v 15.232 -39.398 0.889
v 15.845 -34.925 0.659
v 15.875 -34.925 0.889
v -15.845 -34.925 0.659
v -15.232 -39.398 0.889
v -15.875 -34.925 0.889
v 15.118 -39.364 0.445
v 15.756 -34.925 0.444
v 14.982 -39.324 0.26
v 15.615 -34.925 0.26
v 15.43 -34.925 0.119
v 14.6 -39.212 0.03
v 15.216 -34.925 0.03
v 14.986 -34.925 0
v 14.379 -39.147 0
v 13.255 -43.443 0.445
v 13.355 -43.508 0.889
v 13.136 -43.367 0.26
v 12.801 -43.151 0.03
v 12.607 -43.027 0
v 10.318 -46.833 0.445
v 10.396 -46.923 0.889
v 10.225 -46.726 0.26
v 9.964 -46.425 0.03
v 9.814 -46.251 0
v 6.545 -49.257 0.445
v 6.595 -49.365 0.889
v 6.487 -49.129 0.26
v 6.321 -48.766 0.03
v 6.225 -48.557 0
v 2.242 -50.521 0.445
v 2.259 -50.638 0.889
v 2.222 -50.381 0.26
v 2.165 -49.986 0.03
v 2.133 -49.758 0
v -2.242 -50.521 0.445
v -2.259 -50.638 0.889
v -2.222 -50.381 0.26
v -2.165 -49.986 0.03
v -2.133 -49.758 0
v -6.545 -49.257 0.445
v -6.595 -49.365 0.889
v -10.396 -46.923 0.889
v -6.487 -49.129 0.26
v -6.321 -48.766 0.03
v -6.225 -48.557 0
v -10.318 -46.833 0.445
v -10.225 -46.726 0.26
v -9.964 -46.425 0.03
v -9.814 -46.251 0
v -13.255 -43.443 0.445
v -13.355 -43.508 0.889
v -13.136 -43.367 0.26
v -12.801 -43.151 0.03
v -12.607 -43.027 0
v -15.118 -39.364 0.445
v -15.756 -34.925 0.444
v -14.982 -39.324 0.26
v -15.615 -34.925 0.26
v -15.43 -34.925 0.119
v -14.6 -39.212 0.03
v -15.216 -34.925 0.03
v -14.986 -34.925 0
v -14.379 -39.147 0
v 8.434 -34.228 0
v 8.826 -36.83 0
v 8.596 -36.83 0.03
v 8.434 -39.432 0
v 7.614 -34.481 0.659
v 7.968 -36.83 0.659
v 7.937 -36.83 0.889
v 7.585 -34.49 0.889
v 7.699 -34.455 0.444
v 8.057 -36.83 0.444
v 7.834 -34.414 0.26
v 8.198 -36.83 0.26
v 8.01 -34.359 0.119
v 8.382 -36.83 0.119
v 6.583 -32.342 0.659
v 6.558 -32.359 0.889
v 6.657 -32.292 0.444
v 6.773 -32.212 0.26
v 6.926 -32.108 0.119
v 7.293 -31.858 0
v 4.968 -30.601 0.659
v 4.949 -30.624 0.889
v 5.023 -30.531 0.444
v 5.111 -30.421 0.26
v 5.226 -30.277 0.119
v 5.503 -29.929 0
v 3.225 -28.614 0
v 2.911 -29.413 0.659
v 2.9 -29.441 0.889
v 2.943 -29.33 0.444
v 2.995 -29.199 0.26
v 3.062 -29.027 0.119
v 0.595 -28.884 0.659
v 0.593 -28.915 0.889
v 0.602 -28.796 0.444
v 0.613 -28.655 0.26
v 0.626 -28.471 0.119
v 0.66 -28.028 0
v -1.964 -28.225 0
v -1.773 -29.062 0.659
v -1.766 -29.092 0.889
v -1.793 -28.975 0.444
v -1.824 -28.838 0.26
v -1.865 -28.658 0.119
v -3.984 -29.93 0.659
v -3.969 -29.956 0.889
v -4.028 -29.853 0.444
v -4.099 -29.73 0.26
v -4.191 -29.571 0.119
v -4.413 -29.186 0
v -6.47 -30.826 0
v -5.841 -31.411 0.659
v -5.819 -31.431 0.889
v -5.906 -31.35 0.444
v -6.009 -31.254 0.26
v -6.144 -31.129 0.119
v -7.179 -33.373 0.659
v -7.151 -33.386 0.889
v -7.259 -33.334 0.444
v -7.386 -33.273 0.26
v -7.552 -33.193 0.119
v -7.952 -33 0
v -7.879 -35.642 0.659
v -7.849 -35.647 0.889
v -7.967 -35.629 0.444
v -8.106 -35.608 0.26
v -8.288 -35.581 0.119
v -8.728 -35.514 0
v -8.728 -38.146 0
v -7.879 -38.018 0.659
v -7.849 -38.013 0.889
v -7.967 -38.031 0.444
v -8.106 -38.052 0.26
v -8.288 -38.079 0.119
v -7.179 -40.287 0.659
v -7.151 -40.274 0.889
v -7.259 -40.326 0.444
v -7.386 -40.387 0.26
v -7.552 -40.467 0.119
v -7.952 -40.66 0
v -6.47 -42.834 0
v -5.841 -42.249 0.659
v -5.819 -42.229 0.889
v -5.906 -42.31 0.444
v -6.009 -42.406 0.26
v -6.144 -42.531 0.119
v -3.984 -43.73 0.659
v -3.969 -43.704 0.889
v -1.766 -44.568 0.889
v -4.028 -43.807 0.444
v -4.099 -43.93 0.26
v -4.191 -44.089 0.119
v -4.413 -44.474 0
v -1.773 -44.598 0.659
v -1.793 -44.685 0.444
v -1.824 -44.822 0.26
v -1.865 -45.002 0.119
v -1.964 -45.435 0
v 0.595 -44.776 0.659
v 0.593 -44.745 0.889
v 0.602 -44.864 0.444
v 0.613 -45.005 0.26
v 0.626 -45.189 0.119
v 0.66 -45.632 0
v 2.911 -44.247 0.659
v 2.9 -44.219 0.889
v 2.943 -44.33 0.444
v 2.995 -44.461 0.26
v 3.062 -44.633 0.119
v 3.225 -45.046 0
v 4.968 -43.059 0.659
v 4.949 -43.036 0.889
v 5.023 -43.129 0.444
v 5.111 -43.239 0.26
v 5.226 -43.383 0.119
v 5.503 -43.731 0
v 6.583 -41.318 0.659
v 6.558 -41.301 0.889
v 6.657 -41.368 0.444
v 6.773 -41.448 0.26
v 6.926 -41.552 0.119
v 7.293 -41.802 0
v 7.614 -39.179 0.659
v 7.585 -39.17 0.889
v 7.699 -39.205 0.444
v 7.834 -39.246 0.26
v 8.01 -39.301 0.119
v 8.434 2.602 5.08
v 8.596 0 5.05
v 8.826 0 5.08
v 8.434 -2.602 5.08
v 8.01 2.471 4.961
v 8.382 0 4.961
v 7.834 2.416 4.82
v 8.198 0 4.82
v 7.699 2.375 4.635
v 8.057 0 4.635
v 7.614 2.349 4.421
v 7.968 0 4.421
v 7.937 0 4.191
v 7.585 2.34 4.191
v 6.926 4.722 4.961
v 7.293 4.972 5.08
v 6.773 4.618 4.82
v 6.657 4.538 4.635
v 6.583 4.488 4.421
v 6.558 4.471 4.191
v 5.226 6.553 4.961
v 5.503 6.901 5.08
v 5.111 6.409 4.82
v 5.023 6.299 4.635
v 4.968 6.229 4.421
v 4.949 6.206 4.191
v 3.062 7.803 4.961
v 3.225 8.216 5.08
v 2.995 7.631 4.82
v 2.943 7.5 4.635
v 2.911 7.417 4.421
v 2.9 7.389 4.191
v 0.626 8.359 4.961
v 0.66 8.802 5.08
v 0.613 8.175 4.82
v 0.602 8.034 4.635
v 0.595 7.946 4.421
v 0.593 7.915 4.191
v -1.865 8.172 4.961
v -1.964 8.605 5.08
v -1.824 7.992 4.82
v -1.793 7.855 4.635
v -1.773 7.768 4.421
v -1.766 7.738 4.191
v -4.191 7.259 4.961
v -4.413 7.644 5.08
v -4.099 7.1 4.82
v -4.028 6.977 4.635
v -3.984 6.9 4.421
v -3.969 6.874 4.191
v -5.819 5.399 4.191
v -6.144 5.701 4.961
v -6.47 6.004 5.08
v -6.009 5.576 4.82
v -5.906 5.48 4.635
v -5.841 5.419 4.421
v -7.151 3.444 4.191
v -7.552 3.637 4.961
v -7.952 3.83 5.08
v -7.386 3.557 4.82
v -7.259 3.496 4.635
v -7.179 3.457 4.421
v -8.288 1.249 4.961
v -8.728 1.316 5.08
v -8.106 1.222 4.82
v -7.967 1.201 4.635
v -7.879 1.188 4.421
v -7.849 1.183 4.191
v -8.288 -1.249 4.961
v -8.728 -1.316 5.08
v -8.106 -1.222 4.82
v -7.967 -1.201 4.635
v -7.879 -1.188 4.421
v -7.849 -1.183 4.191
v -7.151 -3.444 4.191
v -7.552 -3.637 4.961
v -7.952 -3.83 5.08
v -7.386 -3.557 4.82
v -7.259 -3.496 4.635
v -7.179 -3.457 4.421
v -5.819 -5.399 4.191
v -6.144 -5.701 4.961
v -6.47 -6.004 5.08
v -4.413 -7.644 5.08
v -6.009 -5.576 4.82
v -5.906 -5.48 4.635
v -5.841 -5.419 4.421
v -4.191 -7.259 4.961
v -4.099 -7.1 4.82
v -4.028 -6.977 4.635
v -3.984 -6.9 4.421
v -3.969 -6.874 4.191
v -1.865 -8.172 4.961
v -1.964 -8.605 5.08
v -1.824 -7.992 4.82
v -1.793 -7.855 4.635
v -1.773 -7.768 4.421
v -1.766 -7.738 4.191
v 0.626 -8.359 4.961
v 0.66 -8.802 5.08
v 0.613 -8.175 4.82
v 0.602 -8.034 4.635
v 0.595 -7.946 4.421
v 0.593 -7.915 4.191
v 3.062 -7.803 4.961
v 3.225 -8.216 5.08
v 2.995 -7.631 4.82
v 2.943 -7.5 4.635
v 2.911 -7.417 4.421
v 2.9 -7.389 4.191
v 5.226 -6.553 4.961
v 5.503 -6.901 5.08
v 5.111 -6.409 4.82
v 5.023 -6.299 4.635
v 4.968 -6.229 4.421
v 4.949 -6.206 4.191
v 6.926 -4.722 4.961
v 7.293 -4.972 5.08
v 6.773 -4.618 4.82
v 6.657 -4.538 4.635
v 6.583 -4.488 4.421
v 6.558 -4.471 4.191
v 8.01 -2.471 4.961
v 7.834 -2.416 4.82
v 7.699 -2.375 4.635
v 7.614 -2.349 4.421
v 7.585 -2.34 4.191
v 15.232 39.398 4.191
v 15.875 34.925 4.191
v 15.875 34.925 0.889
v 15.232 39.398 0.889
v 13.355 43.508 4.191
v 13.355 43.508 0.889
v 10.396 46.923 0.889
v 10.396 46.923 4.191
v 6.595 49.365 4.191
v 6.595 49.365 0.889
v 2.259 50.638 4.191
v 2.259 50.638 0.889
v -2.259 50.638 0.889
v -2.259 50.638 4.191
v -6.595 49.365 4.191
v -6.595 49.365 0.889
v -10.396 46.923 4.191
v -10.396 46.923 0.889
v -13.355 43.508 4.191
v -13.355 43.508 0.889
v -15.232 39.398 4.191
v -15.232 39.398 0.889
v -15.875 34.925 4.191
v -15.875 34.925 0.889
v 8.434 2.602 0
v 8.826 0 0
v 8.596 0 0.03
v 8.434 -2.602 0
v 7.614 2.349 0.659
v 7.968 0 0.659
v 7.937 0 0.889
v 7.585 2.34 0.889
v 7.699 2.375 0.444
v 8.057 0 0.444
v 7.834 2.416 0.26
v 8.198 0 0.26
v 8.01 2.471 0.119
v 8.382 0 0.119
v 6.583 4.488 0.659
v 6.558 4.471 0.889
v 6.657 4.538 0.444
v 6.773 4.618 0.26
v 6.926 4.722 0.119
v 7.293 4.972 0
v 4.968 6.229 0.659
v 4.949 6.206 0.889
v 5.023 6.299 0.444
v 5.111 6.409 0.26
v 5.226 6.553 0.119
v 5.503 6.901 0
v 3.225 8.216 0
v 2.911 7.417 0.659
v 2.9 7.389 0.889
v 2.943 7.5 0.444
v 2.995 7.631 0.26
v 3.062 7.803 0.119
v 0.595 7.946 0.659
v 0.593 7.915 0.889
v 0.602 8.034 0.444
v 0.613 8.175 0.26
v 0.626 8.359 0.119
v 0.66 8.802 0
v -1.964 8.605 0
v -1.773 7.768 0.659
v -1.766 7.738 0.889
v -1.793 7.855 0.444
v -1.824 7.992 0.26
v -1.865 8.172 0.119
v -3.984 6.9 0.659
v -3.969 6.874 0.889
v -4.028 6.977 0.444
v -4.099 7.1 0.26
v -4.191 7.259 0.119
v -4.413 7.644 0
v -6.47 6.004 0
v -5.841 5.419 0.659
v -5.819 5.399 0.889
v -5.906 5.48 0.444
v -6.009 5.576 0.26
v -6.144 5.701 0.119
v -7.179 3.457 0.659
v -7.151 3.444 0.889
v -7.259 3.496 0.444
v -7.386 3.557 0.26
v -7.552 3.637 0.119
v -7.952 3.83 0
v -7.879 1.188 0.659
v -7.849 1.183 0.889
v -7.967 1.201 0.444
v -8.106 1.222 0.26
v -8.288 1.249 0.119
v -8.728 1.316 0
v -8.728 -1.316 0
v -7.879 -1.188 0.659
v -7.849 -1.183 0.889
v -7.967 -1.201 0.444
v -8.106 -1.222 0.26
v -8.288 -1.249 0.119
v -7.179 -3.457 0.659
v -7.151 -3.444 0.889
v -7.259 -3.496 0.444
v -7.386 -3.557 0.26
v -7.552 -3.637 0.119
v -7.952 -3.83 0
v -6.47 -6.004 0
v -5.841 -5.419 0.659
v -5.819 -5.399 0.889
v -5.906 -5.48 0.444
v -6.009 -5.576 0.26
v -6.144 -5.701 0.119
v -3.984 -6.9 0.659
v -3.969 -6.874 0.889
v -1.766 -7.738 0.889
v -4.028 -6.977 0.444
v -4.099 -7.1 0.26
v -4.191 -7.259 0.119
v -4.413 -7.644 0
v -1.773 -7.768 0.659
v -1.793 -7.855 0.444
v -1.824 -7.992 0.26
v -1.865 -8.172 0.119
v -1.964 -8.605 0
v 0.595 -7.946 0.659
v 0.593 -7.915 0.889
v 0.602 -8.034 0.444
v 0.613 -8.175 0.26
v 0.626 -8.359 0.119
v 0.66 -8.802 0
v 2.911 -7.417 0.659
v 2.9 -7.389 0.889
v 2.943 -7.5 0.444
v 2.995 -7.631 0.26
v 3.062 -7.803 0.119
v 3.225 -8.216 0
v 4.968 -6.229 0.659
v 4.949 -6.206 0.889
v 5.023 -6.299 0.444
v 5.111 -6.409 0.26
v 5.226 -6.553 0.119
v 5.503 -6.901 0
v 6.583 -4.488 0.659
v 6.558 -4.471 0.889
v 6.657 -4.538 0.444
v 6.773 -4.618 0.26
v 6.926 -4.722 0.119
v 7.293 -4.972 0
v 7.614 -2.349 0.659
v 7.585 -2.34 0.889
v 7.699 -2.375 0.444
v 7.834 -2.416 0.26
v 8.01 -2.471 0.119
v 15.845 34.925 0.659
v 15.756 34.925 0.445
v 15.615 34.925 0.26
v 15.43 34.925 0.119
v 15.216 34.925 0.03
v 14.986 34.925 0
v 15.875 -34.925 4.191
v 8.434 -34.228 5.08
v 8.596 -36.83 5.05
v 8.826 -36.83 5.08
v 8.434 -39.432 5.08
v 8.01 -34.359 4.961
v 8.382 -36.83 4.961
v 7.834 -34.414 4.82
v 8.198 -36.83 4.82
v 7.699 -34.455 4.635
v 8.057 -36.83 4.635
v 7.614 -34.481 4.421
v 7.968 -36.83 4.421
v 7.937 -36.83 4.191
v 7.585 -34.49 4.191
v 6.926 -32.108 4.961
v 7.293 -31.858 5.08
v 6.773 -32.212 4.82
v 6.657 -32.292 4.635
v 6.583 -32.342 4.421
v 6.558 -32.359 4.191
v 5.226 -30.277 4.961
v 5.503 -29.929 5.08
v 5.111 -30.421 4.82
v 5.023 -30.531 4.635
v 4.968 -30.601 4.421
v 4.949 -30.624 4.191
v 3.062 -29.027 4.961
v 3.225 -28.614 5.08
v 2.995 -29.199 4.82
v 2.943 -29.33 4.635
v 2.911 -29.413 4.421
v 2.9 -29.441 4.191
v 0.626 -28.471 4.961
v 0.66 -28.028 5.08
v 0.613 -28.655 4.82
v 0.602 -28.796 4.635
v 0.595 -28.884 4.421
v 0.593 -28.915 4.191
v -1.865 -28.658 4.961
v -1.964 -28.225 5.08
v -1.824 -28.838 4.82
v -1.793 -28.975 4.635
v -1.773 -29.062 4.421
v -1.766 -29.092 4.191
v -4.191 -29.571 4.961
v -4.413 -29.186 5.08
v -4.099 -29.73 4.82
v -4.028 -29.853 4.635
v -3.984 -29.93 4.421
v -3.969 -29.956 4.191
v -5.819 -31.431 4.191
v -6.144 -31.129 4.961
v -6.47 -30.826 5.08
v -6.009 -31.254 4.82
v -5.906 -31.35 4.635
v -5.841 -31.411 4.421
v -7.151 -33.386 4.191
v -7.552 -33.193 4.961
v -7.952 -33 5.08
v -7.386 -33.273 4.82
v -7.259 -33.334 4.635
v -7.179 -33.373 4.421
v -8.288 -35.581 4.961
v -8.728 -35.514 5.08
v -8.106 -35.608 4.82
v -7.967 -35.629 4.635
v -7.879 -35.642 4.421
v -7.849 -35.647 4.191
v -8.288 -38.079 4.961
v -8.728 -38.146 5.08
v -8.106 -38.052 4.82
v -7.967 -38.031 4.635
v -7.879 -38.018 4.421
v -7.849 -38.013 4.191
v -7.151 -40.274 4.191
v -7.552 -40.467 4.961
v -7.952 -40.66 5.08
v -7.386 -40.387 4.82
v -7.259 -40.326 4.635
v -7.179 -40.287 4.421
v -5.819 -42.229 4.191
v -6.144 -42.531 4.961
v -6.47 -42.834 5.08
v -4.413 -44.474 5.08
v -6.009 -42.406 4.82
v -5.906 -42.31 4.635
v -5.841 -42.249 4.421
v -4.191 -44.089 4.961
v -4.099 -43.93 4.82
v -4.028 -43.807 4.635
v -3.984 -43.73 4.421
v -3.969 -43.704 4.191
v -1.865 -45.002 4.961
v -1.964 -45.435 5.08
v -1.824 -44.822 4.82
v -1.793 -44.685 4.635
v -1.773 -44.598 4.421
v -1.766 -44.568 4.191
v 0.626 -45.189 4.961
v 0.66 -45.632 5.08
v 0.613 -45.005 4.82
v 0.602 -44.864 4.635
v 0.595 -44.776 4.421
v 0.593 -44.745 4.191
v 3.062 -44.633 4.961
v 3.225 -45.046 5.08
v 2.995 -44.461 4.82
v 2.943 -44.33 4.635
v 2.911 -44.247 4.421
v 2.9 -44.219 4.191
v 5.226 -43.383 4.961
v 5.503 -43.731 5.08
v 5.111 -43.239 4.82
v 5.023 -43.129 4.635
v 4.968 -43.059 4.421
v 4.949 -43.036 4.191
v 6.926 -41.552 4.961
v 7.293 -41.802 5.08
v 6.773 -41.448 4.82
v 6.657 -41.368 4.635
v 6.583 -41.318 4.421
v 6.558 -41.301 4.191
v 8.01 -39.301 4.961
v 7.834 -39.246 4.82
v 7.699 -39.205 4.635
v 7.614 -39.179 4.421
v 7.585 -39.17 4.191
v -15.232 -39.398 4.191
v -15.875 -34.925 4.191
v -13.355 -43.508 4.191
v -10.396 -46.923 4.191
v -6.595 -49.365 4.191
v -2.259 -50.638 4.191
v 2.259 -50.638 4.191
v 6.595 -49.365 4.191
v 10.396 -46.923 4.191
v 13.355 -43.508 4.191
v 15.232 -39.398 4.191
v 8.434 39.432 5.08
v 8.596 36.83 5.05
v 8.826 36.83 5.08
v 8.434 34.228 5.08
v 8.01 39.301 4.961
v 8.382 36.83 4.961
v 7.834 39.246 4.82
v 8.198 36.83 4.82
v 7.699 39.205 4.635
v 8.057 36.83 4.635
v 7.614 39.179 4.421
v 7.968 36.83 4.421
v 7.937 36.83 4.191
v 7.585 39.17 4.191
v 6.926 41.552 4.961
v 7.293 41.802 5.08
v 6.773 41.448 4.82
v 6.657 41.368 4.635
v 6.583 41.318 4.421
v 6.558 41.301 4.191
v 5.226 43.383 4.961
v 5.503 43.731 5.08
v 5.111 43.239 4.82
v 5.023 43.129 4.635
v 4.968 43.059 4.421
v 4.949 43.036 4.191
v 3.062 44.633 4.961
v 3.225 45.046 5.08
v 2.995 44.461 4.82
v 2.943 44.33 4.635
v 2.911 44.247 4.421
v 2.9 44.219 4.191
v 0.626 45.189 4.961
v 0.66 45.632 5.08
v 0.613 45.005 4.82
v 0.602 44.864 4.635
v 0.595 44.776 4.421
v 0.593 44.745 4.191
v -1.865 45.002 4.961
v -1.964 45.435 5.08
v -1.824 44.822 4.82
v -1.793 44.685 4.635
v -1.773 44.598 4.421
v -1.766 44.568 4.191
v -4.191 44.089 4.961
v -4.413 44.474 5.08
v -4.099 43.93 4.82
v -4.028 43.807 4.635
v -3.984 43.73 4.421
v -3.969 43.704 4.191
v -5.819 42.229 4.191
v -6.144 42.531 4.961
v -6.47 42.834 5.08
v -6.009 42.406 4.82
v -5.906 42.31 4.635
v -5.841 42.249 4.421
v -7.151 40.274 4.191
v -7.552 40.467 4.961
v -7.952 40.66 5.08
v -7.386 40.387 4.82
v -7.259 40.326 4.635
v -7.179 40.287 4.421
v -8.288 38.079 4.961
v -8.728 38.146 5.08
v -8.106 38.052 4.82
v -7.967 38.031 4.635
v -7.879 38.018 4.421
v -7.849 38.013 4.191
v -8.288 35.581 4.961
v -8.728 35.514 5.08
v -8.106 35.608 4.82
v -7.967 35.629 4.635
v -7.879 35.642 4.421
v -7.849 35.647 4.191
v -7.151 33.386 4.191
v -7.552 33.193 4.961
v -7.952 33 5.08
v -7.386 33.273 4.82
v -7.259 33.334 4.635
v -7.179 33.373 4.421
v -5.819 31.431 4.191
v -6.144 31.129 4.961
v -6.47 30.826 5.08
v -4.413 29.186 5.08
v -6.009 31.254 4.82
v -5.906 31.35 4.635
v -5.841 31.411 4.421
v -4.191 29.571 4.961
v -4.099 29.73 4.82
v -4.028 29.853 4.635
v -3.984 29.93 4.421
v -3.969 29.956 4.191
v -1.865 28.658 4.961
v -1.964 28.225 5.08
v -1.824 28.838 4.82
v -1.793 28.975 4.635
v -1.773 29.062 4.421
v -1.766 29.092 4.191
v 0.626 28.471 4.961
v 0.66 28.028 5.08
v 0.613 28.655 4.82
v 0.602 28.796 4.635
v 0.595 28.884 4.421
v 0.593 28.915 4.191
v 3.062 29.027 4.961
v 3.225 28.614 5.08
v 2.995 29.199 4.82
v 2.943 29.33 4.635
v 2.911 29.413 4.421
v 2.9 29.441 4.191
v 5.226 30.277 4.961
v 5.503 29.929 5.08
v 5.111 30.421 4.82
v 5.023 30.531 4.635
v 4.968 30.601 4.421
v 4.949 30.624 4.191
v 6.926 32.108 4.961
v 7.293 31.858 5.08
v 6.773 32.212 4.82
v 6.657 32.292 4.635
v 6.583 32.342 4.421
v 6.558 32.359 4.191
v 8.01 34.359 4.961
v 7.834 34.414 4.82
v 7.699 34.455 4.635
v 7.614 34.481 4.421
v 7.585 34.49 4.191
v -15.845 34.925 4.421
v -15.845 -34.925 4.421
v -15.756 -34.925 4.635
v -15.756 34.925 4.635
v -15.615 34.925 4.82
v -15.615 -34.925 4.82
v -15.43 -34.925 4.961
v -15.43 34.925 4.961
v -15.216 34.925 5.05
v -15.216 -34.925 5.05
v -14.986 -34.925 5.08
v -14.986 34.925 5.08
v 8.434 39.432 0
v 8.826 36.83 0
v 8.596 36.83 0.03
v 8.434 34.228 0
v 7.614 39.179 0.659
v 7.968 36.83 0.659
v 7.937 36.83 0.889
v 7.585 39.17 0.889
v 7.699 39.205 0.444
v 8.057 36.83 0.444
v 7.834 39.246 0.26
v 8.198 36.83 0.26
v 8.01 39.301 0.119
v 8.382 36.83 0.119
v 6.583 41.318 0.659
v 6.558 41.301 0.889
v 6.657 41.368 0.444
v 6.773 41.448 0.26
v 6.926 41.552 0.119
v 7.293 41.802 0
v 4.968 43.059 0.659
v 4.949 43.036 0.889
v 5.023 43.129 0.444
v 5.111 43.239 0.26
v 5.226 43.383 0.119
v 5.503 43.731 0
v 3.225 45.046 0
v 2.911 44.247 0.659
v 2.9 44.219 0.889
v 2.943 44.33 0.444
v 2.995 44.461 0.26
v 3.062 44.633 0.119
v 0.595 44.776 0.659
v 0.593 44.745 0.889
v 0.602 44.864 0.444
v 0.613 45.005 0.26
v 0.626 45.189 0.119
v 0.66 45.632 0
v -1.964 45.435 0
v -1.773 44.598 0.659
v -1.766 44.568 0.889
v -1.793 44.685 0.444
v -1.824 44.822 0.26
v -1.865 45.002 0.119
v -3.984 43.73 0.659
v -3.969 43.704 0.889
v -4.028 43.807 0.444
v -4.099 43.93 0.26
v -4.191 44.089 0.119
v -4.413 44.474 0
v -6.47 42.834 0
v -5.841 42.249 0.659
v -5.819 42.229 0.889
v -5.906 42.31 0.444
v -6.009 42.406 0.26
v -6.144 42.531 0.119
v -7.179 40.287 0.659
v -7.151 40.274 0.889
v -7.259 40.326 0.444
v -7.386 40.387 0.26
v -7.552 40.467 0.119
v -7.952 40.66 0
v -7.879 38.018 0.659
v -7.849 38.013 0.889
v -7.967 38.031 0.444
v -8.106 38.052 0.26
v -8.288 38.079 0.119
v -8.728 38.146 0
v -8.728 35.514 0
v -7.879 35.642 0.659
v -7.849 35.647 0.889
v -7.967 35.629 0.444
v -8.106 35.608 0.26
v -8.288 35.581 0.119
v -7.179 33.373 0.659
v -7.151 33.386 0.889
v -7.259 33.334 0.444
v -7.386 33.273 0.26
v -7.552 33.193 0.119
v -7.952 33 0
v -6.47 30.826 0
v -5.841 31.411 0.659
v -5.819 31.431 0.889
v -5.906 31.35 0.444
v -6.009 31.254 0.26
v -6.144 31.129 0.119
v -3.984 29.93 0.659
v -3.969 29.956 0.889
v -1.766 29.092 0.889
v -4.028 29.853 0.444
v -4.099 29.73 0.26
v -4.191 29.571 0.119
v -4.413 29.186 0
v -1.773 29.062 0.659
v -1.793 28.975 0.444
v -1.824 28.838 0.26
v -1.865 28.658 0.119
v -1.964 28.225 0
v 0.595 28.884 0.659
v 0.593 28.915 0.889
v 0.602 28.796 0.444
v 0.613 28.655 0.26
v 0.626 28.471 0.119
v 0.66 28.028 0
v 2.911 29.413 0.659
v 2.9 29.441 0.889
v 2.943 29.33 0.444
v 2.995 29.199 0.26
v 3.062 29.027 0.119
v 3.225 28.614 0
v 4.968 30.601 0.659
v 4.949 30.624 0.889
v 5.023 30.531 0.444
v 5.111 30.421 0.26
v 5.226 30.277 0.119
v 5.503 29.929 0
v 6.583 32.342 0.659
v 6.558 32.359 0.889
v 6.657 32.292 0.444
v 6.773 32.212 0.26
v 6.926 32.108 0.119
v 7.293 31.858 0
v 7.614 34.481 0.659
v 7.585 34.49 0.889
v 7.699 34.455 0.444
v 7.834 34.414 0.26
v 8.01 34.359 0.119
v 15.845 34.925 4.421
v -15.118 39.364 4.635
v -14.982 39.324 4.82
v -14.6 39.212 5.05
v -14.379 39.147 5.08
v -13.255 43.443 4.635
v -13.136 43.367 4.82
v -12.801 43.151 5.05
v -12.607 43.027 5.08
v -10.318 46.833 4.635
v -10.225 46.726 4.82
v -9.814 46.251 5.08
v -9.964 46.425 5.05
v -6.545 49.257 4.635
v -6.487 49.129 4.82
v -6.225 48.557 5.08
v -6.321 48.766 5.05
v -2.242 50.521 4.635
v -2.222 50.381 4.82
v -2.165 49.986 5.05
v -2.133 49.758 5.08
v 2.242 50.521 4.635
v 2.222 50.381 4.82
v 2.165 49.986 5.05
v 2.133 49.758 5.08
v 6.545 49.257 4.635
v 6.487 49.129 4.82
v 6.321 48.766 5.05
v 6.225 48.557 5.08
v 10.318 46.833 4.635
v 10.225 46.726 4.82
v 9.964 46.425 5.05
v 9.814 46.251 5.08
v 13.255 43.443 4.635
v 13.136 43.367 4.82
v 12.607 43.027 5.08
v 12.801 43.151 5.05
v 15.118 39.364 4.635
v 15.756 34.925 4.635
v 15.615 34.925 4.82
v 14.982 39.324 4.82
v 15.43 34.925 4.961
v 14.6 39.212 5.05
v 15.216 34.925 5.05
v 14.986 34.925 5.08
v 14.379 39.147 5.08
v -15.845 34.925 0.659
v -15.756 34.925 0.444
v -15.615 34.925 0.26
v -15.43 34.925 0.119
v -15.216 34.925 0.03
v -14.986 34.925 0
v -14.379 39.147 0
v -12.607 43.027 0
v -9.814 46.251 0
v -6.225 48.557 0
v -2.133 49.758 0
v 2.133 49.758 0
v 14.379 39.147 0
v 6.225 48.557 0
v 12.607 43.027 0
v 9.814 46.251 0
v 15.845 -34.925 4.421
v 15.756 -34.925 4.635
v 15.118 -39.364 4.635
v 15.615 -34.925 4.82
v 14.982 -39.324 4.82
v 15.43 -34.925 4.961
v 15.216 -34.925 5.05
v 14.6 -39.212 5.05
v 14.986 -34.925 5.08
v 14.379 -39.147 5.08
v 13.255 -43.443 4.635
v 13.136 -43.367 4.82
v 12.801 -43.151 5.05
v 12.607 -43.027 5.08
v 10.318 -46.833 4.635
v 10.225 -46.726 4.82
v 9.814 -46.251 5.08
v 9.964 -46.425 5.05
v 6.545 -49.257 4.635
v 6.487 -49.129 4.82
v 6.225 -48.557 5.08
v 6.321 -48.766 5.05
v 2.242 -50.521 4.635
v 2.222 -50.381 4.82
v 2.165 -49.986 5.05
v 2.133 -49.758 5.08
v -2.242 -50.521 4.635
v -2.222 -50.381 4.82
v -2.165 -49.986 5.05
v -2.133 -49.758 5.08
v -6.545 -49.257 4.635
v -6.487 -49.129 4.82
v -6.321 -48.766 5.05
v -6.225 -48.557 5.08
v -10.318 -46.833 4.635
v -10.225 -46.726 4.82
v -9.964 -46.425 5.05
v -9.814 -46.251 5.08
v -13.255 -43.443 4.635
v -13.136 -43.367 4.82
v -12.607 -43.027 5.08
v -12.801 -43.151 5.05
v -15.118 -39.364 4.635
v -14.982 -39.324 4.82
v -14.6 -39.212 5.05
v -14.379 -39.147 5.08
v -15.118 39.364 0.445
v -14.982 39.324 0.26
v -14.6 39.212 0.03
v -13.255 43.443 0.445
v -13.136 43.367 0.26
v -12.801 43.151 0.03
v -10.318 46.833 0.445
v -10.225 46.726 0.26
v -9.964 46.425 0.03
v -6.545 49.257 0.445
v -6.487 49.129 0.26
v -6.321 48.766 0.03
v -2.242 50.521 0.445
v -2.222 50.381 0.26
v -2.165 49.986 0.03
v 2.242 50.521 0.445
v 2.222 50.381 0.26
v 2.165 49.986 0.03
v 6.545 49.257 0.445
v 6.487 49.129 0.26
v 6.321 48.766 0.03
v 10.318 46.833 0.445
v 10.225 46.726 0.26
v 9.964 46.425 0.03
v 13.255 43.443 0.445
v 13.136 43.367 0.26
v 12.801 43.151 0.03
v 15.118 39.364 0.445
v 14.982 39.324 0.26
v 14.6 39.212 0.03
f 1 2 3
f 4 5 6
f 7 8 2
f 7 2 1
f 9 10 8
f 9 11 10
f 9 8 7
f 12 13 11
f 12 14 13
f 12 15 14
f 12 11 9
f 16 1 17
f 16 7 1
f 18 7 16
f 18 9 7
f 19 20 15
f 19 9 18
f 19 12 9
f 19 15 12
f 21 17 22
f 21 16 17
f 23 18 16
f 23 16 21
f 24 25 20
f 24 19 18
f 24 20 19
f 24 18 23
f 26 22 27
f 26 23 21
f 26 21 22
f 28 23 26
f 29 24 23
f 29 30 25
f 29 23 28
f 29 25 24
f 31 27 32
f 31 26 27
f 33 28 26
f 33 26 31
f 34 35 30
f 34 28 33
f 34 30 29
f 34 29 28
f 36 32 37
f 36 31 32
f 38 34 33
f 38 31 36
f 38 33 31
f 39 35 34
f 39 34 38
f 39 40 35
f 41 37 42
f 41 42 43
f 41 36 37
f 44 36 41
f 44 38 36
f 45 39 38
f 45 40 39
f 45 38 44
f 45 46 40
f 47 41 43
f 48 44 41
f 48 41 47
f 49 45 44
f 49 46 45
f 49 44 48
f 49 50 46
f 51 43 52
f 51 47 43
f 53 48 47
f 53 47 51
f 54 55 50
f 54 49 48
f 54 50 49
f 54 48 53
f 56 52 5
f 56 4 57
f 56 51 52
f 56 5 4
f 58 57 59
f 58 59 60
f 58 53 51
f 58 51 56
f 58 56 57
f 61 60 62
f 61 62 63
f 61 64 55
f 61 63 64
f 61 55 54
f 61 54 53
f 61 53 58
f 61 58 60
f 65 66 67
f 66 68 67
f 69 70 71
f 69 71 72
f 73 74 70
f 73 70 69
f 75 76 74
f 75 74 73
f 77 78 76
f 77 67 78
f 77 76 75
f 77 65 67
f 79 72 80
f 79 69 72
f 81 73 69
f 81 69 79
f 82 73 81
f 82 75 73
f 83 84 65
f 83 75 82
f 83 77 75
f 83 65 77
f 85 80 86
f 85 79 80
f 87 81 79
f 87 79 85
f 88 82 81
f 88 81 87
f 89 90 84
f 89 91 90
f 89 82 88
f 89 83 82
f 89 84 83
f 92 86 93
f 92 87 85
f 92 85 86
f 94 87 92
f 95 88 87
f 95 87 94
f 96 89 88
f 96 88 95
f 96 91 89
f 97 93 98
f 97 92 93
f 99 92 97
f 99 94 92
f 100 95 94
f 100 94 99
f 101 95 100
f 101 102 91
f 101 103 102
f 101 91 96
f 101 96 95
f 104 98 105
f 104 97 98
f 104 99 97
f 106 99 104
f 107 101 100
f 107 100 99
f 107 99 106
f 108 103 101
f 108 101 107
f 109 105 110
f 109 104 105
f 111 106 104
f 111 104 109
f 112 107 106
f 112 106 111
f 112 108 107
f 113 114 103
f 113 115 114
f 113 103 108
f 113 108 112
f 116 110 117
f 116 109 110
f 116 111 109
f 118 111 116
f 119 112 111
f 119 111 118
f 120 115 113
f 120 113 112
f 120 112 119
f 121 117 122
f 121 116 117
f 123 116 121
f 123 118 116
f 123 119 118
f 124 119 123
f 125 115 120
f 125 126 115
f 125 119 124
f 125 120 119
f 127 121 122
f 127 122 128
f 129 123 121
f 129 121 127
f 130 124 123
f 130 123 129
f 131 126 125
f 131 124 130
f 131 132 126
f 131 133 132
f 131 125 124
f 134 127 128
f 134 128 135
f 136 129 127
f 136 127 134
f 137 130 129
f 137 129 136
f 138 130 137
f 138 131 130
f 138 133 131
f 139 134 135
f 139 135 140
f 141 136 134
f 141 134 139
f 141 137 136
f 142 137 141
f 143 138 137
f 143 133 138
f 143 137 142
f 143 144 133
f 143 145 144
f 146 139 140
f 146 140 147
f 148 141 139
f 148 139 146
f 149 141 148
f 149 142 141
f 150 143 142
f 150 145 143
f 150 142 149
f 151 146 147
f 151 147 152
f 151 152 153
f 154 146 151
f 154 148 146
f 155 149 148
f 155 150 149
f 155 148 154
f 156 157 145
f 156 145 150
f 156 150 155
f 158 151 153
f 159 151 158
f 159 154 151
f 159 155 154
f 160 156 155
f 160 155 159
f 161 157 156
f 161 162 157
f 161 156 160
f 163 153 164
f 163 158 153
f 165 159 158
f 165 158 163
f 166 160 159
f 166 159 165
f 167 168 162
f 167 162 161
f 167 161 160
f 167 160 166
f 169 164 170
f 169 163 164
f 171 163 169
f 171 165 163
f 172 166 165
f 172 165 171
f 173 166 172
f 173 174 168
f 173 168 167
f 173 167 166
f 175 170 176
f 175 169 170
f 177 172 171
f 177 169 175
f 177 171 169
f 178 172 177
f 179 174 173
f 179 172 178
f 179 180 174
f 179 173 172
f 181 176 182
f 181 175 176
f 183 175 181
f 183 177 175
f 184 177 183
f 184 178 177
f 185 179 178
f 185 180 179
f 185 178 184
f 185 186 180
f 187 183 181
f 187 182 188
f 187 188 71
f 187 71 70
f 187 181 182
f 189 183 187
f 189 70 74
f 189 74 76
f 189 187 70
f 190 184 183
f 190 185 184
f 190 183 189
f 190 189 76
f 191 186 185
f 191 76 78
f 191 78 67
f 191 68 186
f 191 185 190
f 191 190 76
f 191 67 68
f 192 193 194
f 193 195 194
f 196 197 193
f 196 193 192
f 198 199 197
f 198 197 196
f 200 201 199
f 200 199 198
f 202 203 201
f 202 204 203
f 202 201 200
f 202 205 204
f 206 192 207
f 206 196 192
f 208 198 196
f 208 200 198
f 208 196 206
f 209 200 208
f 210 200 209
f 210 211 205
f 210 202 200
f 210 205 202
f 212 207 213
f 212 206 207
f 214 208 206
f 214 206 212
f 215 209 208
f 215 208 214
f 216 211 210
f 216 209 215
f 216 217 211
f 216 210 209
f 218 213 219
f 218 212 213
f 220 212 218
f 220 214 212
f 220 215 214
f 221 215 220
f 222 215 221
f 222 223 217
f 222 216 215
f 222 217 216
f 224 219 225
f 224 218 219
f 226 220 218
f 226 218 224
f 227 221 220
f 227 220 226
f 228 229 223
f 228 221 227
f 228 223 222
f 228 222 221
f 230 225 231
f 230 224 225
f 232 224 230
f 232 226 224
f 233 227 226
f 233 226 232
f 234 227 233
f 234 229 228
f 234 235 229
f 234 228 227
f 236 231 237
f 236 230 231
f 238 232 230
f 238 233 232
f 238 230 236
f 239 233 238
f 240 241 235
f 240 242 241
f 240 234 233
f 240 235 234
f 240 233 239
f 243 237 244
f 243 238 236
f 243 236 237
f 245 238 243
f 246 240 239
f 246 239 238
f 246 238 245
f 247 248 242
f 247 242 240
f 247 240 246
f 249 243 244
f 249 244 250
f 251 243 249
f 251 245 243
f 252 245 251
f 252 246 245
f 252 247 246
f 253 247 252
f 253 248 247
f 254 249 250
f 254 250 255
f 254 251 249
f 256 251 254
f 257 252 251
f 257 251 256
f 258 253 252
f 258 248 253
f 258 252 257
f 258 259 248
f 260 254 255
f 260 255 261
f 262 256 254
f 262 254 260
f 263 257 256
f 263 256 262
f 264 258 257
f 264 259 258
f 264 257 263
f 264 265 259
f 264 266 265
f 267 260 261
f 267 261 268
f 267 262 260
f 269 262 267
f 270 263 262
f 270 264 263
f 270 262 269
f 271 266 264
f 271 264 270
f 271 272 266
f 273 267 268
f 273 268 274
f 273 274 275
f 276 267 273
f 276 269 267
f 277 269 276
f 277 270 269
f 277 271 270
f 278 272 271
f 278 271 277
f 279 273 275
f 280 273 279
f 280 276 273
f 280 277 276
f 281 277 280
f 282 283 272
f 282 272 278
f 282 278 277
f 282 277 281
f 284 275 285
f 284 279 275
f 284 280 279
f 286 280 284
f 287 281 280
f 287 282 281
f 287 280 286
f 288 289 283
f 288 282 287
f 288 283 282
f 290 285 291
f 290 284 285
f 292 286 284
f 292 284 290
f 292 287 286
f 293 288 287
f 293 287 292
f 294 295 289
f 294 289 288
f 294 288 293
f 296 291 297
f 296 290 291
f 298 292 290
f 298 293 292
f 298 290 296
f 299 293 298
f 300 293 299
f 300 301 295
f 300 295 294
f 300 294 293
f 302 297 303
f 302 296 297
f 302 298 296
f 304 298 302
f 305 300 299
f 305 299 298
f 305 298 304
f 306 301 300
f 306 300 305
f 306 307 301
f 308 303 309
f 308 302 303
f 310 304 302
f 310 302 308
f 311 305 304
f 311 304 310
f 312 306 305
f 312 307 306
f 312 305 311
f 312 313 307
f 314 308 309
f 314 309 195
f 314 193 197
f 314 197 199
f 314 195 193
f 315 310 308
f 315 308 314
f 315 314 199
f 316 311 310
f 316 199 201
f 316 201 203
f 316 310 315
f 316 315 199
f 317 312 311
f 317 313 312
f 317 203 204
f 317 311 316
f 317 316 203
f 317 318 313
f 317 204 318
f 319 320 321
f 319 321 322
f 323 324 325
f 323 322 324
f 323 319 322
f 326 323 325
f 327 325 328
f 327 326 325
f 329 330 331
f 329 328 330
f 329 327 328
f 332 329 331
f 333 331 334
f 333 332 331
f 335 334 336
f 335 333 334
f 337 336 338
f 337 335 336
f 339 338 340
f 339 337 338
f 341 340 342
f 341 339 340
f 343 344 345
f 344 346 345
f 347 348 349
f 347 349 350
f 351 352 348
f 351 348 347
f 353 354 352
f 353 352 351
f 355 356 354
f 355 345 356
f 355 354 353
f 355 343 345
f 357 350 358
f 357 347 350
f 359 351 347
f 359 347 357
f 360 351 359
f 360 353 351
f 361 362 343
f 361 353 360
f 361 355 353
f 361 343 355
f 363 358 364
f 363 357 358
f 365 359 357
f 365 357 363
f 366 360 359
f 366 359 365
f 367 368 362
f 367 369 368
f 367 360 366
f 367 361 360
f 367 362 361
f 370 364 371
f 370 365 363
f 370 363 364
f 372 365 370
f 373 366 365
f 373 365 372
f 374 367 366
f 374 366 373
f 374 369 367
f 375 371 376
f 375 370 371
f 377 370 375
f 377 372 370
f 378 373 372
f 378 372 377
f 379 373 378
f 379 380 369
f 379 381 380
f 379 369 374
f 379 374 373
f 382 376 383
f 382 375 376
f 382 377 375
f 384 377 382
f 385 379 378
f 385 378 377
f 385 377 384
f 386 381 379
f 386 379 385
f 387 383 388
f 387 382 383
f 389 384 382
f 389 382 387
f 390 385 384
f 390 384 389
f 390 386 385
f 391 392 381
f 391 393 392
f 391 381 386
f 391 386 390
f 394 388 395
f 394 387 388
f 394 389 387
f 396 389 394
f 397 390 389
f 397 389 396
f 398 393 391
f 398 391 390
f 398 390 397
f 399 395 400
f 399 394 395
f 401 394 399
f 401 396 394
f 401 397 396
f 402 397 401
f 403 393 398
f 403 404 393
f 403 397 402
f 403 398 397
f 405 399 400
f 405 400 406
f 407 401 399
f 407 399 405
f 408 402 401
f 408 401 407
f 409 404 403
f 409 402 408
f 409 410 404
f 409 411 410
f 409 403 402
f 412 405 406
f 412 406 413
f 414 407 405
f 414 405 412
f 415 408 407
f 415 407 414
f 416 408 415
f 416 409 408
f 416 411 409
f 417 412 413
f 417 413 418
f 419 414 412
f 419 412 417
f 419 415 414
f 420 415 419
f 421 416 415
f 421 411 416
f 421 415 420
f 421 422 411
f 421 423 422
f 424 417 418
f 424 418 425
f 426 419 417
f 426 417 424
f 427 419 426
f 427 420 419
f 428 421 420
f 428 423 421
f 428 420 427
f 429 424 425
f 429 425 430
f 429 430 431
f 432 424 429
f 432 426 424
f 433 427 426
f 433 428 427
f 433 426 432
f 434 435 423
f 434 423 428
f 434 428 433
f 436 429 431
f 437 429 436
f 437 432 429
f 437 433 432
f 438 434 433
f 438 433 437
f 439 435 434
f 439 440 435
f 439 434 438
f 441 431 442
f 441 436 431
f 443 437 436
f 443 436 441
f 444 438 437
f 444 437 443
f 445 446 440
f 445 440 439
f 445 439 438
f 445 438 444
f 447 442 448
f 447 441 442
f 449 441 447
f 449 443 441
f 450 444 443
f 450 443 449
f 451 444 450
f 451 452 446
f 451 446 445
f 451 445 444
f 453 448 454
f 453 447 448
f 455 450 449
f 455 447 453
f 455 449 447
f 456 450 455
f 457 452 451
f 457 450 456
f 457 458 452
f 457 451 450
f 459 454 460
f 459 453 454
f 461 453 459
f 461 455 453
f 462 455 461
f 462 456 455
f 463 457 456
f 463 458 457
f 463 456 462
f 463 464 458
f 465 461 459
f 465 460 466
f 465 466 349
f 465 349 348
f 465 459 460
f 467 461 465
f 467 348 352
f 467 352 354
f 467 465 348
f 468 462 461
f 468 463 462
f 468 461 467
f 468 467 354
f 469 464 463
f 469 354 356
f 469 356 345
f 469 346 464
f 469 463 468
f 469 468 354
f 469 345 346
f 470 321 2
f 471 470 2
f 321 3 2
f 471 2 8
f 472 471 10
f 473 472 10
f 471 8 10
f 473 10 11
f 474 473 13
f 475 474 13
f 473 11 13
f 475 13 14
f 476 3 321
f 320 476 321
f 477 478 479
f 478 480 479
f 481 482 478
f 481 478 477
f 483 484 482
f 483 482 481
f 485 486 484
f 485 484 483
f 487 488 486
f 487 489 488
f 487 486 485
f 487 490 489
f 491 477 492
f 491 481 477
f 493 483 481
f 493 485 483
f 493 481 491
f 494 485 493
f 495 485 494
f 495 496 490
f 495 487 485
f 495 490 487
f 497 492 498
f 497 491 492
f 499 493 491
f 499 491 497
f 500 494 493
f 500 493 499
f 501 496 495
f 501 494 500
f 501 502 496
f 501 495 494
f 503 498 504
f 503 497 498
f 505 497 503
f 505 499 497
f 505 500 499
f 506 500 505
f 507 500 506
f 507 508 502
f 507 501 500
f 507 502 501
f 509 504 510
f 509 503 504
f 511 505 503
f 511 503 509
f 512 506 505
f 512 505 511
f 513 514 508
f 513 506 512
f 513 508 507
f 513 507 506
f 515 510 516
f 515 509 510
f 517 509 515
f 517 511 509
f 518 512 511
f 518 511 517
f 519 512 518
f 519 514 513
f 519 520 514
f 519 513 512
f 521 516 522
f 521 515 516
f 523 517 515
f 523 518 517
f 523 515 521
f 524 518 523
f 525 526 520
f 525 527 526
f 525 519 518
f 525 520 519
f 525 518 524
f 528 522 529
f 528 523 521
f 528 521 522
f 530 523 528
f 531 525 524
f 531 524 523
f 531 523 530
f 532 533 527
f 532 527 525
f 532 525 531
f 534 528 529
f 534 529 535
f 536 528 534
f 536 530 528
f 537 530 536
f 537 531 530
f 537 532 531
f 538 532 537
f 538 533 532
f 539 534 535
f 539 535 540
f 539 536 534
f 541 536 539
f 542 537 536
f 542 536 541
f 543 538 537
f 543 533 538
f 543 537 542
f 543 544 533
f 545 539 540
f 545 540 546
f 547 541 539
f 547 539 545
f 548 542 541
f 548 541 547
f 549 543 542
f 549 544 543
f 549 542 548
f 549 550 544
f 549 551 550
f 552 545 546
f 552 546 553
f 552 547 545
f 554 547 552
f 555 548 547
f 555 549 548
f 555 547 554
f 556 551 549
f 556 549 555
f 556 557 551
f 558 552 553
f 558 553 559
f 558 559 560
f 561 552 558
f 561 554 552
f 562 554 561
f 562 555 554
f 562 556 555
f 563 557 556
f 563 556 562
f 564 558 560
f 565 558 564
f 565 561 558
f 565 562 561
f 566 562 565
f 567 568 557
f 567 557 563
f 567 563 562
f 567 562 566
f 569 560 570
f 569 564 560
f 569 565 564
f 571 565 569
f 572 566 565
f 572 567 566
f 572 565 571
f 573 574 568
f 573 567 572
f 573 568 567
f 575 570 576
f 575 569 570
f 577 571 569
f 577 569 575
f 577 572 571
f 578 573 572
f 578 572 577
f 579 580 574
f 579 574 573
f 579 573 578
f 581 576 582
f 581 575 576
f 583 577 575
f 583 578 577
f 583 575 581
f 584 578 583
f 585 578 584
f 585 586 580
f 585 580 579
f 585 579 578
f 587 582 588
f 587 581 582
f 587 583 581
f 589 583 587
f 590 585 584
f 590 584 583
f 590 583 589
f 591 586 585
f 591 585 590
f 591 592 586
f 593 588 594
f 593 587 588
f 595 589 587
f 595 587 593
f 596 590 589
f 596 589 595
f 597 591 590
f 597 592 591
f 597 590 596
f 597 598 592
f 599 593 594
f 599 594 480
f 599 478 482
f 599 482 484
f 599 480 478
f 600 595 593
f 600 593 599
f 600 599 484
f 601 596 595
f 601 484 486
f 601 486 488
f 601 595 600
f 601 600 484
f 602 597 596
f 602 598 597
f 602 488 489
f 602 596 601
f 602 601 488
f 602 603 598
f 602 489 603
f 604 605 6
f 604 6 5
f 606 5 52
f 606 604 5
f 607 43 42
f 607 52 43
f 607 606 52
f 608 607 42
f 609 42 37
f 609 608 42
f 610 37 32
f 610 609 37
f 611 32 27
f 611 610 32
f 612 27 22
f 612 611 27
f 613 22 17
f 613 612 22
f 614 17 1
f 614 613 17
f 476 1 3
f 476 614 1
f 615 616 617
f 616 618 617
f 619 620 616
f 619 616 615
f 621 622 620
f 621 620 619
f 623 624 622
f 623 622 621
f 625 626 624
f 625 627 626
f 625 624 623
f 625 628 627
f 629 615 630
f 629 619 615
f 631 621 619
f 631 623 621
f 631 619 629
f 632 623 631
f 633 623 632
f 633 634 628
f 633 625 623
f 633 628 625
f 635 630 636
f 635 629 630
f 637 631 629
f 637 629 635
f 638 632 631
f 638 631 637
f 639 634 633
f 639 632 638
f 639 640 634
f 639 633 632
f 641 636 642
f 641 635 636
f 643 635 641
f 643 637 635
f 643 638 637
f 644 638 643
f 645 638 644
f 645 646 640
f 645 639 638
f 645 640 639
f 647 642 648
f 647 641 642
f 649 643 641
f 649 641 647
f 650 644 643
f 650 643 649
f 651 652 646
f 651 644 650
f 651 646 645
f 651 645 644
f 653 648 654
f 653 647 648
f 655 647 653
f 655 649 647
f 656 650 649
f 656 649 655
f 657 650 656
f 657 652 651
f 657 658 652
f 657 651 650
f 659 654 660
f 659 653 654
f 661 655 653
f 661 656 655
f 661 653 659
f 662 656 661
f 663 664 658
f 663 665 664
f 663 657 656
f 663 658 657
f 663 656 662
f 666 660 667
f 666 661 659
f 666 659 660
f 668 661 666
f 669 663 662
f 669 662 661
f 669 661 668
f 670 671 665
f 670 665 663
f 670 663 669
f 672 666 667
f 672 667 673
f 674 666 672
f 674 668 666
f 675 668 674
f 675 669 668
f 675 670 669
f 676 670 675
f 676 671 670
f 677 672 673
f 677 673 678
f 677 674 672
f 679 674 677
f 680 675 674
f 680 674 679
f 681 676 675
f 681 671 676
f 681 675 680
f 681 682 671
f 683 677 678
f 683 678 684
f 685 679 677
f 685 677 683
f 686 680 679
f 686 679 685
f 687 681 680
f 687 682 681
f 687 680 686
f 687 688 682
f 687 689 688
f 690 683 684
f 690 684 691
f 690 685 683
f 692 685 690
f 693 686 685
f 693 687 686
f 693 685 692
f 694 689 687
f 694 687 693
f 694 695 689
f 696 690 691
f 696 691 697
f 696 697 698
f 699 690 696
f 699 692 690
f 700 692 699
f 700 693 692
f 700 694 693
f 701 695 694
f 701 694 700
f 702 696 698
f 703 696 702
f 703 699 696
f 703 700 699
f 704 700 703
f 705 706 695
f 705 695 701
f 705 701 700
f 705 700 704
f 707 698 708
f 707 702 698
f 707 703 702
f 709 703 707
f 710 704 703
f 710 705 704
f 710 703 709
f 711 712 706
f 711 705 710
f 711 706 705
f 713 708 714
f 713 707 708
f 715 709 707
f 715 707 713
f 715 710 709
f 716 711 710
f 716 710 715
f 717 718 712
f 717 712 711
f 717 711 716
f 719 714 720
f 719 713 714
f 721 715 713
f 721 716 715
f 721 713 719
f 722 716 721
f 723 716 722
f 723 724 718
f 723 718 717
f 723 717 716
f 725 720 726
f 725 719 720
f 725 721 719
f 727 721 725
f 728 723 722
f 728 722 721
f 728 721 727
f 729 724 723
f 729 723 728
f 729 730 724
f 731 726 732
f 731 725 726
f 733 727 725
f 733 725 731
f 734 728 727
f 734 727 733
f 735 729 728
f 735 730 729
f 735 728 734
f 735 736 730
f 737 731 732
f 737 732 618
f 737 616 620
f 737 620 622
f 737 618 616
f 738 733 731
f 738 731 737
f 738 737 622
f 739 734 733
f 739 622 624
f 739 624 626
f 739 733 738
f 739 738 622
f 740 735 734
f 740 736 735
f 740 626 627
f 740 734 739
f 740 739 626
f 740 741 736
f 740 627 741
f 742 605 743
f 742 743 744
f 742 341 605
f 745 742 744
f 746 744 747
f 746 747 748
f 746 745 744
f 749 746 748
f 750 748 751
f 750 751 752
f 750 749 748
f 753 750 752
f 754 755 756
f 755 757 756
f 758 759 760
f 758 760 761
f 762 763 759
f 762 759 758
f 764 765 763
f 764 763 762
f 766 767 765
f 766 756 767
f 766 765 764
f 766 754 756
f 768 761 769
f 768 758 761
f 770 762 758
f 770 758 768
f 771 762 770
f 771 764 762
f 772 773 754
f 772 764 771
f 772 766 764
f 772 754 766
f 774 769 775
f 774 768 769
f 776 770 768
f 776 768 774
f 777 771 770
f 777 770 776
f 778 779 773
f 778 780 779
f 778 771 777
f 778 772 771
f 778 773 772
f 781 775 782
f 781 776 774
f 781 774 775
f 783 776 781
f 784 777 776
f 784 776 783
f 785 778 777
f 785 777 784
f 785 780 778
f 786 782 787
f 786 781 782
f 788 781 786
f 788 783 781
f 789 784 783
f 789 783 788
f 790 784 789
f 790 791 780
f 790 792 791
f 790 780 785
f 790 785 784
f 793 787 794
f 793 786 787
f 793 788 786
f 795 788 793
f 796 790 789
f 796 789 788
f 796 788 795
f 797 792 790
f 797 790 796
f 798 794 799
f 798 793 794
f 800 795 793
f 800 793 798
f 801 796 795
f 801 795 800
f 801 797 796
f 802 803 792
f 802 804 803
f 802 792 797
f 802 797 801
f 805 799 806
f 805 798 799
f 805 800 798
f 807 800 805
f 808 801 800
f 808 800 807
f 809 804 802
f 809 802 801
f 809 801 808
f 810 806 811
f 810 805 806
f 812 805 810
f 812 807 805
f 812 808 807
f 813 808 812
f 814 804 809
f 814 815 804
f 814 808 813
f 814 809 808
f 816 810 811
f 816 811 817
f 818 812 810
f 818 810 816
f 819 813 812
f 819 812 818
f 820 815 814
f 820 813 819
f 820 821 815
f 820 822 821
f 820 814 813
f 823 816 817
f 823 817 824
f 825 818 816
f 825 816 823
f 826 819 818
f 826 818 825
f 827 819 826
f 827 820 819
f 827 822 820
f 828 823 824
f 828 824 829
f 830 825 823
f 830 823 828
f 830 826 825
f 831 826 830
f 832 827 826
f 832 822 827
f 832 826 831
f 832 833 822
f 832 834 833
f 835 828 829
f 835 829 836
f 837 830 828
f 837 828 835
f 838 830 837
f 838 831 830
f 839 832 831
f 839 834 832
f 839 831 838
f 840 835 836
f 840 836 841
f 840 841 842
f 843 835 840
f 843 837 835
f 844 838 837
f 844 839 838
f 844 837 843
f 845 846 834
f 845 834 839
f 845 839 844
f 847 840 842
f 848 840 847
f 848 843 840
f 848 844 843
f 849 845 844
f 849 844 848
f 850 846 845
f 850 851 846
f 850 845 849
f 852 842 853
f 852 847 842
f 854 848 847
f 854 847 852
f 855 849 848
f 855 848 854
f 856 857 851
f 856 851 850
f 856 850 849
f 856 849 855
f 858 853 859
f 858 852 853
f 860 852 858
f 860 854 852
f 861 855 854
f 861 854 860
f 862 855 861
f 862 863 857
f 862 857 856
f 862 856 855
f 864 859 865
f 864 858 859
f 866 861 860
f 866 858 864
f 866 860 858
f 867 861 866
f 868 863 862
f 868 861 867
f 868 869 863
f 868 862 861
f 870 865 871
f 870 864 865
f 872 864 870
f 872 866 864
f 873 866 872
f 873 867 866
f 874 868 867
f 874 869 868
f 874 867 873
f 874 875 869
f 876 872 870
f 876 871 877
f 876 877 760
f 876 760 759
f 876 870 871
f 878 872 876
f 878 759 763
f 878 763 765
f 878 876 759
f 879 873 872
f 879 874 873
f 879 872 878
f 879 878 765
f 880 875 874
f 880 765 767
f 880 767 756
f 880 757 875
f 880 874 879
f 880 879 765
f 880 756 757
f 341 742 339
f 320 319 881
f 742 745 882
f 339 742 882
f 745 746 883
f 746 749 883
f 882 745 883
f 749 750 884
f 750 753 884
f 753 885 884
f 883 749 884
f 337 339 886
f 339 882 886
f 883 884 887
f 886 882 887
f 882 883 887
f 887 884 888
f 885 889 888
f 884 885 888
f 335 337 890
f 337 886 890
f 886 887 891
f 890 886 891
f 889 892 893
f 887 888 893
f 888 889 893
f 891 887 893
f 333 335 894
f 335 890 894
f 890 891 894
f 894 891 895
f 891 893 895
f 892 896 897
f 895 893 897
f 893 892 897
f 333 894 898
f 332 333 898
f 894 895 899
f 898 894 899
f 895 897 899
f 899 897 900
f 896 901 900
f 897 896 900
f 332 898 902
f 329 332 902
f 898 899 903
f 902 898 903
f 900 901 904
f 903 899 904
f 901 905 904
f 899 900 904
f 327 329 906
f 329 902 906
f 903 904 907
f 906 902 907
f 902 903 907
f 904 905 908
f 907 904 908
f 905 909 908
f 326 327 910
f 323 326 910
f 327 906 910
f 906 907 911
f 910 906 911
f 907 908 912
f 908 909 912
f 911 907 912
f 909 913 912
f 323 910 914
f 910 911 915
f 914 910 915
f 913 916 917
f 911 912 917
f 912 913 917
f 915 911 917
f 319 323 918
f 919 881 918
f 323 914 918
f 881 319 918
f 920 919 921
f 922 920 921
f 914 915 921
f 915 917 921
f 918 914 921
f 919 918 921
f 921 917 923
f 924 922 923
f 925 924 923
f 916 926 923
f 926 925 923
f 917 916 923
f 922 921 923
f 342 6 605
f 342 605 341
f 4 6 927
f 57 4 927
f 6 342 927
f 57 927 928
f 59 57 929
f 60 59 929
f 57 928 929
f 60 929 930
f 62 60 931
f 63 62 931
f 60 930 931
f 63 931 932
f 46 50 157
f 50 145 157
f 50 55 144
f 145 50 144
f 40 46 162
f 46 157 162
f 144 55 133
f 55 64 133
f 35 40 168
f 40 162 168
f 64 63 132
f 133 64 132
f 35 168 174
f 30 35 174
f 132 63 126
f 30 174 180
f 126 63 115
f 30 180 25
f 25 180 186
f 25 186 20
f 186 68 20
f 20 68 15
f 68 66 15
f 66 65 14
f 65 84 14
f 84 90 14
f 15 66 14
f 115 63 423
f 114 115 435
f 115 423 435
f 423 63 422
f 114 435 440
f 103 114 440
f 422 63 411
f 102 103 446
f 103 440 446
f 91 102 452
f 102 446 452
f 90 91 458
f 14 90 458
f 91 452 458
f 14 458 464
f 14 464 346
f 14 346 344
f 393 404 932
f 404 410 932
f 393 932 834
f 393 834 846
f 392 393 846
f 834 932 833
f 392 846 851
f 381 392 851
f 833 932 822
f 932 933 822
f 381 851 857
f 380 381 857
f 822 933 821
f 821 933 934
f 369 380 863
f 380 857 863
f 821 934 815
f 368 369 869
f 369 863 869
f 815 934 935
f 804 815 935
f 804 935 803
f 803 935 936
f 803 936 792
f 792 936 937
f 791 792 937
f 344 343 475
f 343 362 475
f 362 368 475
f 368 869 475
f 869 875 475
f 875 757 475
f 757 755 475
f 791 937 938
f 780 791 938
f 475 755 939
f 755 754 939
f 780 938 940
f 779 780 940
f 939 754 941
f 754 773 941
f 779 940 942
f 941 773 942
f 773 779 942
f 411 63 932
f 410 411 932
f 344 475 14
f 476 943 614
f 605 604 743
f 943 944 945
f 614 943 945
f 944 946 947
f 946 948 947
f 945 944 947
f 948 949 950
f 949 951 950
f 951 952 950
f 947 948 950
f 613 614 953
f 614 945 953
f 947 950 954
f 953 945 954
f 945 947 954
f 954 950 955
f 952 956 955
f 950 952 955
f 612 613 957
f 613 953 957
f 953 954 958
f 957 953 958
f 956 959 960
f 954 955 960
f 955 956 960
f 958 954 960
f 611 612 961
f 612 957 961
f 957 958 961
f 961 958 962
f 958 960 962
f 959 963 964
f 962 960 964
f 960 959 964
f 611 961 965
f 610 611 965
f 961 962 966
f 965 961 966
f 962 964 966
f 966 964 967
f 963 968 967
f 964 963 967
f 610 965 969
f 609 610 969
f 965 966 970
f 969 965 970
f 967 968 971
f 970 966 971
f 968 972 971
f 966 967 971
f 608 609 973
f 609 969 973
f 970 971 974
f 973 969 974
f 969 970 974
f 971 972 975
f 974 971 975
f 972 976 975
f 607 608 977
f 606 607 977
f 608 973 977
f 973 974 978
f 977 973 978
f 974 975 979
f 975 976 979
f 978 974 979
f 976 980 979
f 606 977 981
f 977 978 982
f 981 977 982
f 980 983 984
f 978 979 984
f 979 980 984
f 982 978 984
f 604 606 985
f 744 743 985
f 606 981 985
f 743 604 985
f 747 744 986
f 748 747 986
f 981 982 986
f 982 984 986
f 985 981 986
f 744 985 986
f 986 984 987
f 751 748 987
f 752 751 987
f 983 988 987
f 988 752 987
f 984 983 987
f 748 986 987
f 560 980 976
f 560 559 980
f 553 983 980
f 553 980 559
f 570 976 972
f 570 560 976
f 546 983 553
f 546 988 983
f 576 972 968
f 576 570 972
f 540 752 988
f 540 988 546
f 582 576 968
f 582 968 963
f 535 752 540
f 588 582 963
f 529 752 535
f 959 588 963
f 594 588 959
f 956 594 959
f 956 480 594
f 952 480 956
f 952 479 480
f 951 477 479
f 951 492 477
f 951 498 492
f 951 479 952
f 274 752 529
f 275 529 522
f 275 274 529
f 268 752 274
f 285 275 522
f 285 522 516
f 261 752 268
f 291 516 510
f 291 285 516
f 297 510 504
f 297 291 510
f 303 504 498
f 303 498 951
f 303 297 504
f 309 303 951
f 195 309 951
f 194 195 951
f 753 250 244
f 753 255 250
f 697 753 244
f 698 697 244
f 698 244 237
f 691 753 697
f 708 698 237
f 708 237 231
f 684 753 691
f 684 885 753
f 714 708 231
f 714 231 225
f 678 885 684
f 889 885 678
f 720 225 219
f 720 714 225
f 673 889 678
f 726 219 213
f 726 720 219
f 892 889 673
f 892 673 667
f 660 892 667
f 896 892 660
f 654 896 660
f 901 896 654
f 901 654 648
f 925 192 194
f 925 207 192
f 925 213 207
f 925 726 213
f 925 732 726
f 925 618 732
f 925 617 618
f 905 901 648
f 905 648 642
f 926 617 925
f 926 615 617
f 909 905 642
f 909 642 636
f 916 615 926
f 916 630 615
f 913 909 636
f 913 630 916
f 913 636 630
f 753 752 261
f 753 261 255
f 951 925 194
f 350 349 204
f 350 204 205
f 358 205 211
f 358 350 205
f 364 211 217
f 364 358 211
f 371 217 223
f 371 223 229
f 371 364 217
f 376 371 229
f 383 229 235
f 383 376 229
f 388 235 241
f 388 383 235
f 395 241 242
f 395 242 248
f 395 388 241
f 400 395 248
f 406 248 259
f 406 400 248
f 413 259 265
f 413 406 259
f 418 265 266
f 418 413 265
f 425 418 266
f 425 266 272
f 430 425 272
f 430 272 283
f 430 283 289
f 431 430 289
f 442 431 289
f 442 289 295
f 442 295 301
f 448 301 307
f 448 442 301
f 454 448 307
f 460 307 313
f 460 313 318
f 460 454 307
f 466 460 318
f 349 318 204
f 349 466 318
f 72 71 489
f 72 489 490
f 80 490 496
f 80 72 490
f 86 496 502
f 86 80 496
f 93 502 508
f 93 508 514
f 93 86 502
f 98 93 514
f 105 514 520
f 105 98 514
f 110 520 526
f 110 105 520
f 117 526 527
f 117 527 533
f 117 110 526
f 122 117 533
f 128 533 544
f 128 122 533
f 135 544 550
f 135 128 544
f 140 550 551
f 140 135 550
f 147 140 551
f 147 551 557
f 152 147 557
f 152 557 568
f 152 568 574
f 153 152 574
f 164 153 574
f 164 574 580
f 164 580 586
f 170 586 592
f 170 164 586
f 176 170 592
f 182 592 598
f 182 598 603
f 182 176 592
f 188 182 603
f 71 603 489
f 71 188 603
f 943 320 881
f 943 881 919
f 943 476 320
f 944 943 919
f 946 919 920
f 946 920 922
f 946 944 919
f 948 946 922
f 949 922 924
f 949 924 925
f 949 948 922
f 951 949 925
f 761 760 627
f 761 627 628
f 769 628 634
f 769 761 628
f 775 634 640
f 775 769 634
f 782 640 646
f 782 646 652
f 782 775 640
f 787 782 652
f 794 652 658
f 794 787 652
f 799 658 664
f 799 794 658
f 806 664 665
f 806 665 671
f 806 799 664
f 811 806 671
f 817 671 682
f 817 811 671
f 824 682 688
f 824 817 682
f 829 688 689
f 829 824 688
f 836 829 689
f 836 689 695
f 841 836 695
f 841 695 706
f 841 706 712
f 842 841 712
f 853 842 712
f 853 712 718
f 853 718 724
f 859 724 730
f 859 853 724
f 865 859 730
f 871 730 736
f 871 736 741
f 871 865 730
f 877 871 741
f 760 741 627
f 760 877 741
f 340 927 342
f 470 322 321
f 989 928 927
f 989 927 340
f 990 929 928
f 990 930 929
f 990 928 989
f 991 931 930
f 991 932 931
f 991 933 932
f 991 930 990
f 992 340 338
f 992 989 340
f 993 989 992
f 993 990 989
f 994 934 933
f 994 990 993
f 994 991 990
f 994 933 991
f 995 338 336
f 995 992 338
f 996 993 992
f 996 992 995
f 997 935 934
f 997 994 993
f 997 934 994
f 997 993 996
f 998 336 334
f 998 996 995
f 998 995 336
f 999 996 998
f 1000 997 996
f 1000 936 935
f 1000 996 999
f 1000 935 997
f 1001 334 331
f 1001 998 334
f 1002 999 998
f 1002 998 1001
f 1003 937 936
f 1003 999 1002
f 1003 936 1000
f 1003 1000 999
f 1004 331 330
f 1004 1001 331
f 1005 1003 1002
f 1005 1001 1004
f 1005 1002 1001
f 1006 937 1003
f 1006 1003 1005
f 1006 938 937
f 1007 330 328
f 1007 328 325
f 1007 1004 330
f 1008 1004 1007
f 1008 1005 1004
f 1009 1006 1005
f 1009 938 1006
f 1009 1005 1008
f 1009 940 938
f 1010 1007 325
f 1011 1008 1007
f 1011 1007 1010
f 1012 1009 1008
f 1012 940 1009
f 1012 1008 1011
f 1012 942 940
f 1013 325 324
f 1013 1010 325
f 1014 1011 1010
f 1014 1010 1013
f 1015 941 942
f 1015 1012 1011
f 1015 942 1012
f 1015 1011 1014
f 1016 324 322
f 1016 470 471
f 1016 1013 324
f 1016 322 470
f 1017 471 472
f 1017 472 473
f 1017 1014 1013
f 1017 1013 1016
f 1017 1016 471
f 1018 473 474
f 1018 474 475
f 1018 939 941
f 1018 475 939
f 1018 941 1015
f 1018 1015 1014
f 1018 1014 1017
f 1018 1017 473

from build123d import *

# Parameters (mm, degrees)
SKETCH1_W           = 31.75
SKETCH1_H           = 101.6
SKETCH1_R           = 7.9375
BOSS_EXTRUDE1_DEPTH = 5.08
FILLET1_RADIUS      = 15.875
FILLET1_LENGTH      = 5.08
FILLET2_RADIUS      = 15.875
FILLET2_LENGTH      = 5.08
FILLET3_R           = 0.889


with BuildPart() as part:
    # Sketch1 → Boss-Extrude1 (new body)
    with BuildSketch(Plane.XY):
        Rectangle(SKETCH1_W, SKETCH1_H)
        with Locations((0, -36.83)):
            Circle(SKETCH1_R, mode=Mode.SUBTRACT)
        Circle(SKETCH1_R, mode=Mode.SUBTRACT)
        with Locations((0, 36.83)):
            Circle(SKETCH1_R, mode=Mode.SUBTRACT)
    extrude(amount=BOSS_EXTRUDE1_DEPTH)

    # Fillet1: full round fillet: the end face becomes a half cylinder, R = half its width
    fillet1_face = Plane((0, 50.8, 2.54), x_dir=(0, 0, 1), z_dir=(0, 1, 0))  # on the end face: x along it, z out of the body
    fillet1_slab = fillet1_face.offset(-FILLET1_RADIUS / 2) * Box(FILLET1_LENGTH, 2 * FILLET1_RADIUS, FILLET1_RADIUS, mode=Mode.PRIVATE)  # the body's end, R deep
    fillet1_round = Plane((0, 34.925, 2.54), x_dir=(0, 1, 0), z_dir=(0, 0, 1)) * Cylinder(FILLET1_RADIUS, FILLET1_LENGTH, mode=Mode.PRIVATE)  # its axis R under the face
    add(fillet1_slab - fillet1_round, mode=Mode.SUBTRACT)

    # Fillet2: full round fillet: the end face becomes a half cylinder, R = half its width
    fillet2_face = Plane((0, -50.8, 2.54), x_dir=(0, 0, 1), z_dir=(0, -1, 0))  # on the end face: x along it, z out of the body
    fillet2_slab = fillet2_face.offset(-FILLET2_RADIUS / 2) * Box(FILLET2_LENGTH, 2 * FILLET2_RADIUS, FILLET2_RADIUS, mode=Mode.PRIVATE)  # the body's end, R deep
    fillet2_round = Plane((0, -34.925, 2.54), x_dir=(0, -1, 0), z_dir=(0, 0, 1)) * Cylinder(FILLET2_RADIUS, FILLET2_LENGTH, mode=Mode.PRIVATE)  # its axis R under the face
    add(fillet2_slab - fillet2_round, mode=Mode.SUBTRACT)

    # Fillet3
    fillet3_edges = [part.edges().sort_by_distance(p)[0] for p in [
        (-7.9375, -36.83, 0),
        (-7.9375, -36.83, 5.08),
        (-7.9375, 0, 0),
        (-7.9375, 0, 5.08),
        (-7.9375, 36.83, 0),
        (-7.9375, 36.83, 5.08),
        (-15.875, 0, 0),
        (-15.875, 0, 5.08),
        (0, 50.8, 0),
        (0, 50.8, 5.08),
        (15.875, 0, 0),
        (15.875, 0, 5.08),
        (0, -50.8, 0),
        (0, -50.8, 5.08),
    ]]
    fillet(fillet3_edges, radius=FILLET3_R)


solid = part.part
